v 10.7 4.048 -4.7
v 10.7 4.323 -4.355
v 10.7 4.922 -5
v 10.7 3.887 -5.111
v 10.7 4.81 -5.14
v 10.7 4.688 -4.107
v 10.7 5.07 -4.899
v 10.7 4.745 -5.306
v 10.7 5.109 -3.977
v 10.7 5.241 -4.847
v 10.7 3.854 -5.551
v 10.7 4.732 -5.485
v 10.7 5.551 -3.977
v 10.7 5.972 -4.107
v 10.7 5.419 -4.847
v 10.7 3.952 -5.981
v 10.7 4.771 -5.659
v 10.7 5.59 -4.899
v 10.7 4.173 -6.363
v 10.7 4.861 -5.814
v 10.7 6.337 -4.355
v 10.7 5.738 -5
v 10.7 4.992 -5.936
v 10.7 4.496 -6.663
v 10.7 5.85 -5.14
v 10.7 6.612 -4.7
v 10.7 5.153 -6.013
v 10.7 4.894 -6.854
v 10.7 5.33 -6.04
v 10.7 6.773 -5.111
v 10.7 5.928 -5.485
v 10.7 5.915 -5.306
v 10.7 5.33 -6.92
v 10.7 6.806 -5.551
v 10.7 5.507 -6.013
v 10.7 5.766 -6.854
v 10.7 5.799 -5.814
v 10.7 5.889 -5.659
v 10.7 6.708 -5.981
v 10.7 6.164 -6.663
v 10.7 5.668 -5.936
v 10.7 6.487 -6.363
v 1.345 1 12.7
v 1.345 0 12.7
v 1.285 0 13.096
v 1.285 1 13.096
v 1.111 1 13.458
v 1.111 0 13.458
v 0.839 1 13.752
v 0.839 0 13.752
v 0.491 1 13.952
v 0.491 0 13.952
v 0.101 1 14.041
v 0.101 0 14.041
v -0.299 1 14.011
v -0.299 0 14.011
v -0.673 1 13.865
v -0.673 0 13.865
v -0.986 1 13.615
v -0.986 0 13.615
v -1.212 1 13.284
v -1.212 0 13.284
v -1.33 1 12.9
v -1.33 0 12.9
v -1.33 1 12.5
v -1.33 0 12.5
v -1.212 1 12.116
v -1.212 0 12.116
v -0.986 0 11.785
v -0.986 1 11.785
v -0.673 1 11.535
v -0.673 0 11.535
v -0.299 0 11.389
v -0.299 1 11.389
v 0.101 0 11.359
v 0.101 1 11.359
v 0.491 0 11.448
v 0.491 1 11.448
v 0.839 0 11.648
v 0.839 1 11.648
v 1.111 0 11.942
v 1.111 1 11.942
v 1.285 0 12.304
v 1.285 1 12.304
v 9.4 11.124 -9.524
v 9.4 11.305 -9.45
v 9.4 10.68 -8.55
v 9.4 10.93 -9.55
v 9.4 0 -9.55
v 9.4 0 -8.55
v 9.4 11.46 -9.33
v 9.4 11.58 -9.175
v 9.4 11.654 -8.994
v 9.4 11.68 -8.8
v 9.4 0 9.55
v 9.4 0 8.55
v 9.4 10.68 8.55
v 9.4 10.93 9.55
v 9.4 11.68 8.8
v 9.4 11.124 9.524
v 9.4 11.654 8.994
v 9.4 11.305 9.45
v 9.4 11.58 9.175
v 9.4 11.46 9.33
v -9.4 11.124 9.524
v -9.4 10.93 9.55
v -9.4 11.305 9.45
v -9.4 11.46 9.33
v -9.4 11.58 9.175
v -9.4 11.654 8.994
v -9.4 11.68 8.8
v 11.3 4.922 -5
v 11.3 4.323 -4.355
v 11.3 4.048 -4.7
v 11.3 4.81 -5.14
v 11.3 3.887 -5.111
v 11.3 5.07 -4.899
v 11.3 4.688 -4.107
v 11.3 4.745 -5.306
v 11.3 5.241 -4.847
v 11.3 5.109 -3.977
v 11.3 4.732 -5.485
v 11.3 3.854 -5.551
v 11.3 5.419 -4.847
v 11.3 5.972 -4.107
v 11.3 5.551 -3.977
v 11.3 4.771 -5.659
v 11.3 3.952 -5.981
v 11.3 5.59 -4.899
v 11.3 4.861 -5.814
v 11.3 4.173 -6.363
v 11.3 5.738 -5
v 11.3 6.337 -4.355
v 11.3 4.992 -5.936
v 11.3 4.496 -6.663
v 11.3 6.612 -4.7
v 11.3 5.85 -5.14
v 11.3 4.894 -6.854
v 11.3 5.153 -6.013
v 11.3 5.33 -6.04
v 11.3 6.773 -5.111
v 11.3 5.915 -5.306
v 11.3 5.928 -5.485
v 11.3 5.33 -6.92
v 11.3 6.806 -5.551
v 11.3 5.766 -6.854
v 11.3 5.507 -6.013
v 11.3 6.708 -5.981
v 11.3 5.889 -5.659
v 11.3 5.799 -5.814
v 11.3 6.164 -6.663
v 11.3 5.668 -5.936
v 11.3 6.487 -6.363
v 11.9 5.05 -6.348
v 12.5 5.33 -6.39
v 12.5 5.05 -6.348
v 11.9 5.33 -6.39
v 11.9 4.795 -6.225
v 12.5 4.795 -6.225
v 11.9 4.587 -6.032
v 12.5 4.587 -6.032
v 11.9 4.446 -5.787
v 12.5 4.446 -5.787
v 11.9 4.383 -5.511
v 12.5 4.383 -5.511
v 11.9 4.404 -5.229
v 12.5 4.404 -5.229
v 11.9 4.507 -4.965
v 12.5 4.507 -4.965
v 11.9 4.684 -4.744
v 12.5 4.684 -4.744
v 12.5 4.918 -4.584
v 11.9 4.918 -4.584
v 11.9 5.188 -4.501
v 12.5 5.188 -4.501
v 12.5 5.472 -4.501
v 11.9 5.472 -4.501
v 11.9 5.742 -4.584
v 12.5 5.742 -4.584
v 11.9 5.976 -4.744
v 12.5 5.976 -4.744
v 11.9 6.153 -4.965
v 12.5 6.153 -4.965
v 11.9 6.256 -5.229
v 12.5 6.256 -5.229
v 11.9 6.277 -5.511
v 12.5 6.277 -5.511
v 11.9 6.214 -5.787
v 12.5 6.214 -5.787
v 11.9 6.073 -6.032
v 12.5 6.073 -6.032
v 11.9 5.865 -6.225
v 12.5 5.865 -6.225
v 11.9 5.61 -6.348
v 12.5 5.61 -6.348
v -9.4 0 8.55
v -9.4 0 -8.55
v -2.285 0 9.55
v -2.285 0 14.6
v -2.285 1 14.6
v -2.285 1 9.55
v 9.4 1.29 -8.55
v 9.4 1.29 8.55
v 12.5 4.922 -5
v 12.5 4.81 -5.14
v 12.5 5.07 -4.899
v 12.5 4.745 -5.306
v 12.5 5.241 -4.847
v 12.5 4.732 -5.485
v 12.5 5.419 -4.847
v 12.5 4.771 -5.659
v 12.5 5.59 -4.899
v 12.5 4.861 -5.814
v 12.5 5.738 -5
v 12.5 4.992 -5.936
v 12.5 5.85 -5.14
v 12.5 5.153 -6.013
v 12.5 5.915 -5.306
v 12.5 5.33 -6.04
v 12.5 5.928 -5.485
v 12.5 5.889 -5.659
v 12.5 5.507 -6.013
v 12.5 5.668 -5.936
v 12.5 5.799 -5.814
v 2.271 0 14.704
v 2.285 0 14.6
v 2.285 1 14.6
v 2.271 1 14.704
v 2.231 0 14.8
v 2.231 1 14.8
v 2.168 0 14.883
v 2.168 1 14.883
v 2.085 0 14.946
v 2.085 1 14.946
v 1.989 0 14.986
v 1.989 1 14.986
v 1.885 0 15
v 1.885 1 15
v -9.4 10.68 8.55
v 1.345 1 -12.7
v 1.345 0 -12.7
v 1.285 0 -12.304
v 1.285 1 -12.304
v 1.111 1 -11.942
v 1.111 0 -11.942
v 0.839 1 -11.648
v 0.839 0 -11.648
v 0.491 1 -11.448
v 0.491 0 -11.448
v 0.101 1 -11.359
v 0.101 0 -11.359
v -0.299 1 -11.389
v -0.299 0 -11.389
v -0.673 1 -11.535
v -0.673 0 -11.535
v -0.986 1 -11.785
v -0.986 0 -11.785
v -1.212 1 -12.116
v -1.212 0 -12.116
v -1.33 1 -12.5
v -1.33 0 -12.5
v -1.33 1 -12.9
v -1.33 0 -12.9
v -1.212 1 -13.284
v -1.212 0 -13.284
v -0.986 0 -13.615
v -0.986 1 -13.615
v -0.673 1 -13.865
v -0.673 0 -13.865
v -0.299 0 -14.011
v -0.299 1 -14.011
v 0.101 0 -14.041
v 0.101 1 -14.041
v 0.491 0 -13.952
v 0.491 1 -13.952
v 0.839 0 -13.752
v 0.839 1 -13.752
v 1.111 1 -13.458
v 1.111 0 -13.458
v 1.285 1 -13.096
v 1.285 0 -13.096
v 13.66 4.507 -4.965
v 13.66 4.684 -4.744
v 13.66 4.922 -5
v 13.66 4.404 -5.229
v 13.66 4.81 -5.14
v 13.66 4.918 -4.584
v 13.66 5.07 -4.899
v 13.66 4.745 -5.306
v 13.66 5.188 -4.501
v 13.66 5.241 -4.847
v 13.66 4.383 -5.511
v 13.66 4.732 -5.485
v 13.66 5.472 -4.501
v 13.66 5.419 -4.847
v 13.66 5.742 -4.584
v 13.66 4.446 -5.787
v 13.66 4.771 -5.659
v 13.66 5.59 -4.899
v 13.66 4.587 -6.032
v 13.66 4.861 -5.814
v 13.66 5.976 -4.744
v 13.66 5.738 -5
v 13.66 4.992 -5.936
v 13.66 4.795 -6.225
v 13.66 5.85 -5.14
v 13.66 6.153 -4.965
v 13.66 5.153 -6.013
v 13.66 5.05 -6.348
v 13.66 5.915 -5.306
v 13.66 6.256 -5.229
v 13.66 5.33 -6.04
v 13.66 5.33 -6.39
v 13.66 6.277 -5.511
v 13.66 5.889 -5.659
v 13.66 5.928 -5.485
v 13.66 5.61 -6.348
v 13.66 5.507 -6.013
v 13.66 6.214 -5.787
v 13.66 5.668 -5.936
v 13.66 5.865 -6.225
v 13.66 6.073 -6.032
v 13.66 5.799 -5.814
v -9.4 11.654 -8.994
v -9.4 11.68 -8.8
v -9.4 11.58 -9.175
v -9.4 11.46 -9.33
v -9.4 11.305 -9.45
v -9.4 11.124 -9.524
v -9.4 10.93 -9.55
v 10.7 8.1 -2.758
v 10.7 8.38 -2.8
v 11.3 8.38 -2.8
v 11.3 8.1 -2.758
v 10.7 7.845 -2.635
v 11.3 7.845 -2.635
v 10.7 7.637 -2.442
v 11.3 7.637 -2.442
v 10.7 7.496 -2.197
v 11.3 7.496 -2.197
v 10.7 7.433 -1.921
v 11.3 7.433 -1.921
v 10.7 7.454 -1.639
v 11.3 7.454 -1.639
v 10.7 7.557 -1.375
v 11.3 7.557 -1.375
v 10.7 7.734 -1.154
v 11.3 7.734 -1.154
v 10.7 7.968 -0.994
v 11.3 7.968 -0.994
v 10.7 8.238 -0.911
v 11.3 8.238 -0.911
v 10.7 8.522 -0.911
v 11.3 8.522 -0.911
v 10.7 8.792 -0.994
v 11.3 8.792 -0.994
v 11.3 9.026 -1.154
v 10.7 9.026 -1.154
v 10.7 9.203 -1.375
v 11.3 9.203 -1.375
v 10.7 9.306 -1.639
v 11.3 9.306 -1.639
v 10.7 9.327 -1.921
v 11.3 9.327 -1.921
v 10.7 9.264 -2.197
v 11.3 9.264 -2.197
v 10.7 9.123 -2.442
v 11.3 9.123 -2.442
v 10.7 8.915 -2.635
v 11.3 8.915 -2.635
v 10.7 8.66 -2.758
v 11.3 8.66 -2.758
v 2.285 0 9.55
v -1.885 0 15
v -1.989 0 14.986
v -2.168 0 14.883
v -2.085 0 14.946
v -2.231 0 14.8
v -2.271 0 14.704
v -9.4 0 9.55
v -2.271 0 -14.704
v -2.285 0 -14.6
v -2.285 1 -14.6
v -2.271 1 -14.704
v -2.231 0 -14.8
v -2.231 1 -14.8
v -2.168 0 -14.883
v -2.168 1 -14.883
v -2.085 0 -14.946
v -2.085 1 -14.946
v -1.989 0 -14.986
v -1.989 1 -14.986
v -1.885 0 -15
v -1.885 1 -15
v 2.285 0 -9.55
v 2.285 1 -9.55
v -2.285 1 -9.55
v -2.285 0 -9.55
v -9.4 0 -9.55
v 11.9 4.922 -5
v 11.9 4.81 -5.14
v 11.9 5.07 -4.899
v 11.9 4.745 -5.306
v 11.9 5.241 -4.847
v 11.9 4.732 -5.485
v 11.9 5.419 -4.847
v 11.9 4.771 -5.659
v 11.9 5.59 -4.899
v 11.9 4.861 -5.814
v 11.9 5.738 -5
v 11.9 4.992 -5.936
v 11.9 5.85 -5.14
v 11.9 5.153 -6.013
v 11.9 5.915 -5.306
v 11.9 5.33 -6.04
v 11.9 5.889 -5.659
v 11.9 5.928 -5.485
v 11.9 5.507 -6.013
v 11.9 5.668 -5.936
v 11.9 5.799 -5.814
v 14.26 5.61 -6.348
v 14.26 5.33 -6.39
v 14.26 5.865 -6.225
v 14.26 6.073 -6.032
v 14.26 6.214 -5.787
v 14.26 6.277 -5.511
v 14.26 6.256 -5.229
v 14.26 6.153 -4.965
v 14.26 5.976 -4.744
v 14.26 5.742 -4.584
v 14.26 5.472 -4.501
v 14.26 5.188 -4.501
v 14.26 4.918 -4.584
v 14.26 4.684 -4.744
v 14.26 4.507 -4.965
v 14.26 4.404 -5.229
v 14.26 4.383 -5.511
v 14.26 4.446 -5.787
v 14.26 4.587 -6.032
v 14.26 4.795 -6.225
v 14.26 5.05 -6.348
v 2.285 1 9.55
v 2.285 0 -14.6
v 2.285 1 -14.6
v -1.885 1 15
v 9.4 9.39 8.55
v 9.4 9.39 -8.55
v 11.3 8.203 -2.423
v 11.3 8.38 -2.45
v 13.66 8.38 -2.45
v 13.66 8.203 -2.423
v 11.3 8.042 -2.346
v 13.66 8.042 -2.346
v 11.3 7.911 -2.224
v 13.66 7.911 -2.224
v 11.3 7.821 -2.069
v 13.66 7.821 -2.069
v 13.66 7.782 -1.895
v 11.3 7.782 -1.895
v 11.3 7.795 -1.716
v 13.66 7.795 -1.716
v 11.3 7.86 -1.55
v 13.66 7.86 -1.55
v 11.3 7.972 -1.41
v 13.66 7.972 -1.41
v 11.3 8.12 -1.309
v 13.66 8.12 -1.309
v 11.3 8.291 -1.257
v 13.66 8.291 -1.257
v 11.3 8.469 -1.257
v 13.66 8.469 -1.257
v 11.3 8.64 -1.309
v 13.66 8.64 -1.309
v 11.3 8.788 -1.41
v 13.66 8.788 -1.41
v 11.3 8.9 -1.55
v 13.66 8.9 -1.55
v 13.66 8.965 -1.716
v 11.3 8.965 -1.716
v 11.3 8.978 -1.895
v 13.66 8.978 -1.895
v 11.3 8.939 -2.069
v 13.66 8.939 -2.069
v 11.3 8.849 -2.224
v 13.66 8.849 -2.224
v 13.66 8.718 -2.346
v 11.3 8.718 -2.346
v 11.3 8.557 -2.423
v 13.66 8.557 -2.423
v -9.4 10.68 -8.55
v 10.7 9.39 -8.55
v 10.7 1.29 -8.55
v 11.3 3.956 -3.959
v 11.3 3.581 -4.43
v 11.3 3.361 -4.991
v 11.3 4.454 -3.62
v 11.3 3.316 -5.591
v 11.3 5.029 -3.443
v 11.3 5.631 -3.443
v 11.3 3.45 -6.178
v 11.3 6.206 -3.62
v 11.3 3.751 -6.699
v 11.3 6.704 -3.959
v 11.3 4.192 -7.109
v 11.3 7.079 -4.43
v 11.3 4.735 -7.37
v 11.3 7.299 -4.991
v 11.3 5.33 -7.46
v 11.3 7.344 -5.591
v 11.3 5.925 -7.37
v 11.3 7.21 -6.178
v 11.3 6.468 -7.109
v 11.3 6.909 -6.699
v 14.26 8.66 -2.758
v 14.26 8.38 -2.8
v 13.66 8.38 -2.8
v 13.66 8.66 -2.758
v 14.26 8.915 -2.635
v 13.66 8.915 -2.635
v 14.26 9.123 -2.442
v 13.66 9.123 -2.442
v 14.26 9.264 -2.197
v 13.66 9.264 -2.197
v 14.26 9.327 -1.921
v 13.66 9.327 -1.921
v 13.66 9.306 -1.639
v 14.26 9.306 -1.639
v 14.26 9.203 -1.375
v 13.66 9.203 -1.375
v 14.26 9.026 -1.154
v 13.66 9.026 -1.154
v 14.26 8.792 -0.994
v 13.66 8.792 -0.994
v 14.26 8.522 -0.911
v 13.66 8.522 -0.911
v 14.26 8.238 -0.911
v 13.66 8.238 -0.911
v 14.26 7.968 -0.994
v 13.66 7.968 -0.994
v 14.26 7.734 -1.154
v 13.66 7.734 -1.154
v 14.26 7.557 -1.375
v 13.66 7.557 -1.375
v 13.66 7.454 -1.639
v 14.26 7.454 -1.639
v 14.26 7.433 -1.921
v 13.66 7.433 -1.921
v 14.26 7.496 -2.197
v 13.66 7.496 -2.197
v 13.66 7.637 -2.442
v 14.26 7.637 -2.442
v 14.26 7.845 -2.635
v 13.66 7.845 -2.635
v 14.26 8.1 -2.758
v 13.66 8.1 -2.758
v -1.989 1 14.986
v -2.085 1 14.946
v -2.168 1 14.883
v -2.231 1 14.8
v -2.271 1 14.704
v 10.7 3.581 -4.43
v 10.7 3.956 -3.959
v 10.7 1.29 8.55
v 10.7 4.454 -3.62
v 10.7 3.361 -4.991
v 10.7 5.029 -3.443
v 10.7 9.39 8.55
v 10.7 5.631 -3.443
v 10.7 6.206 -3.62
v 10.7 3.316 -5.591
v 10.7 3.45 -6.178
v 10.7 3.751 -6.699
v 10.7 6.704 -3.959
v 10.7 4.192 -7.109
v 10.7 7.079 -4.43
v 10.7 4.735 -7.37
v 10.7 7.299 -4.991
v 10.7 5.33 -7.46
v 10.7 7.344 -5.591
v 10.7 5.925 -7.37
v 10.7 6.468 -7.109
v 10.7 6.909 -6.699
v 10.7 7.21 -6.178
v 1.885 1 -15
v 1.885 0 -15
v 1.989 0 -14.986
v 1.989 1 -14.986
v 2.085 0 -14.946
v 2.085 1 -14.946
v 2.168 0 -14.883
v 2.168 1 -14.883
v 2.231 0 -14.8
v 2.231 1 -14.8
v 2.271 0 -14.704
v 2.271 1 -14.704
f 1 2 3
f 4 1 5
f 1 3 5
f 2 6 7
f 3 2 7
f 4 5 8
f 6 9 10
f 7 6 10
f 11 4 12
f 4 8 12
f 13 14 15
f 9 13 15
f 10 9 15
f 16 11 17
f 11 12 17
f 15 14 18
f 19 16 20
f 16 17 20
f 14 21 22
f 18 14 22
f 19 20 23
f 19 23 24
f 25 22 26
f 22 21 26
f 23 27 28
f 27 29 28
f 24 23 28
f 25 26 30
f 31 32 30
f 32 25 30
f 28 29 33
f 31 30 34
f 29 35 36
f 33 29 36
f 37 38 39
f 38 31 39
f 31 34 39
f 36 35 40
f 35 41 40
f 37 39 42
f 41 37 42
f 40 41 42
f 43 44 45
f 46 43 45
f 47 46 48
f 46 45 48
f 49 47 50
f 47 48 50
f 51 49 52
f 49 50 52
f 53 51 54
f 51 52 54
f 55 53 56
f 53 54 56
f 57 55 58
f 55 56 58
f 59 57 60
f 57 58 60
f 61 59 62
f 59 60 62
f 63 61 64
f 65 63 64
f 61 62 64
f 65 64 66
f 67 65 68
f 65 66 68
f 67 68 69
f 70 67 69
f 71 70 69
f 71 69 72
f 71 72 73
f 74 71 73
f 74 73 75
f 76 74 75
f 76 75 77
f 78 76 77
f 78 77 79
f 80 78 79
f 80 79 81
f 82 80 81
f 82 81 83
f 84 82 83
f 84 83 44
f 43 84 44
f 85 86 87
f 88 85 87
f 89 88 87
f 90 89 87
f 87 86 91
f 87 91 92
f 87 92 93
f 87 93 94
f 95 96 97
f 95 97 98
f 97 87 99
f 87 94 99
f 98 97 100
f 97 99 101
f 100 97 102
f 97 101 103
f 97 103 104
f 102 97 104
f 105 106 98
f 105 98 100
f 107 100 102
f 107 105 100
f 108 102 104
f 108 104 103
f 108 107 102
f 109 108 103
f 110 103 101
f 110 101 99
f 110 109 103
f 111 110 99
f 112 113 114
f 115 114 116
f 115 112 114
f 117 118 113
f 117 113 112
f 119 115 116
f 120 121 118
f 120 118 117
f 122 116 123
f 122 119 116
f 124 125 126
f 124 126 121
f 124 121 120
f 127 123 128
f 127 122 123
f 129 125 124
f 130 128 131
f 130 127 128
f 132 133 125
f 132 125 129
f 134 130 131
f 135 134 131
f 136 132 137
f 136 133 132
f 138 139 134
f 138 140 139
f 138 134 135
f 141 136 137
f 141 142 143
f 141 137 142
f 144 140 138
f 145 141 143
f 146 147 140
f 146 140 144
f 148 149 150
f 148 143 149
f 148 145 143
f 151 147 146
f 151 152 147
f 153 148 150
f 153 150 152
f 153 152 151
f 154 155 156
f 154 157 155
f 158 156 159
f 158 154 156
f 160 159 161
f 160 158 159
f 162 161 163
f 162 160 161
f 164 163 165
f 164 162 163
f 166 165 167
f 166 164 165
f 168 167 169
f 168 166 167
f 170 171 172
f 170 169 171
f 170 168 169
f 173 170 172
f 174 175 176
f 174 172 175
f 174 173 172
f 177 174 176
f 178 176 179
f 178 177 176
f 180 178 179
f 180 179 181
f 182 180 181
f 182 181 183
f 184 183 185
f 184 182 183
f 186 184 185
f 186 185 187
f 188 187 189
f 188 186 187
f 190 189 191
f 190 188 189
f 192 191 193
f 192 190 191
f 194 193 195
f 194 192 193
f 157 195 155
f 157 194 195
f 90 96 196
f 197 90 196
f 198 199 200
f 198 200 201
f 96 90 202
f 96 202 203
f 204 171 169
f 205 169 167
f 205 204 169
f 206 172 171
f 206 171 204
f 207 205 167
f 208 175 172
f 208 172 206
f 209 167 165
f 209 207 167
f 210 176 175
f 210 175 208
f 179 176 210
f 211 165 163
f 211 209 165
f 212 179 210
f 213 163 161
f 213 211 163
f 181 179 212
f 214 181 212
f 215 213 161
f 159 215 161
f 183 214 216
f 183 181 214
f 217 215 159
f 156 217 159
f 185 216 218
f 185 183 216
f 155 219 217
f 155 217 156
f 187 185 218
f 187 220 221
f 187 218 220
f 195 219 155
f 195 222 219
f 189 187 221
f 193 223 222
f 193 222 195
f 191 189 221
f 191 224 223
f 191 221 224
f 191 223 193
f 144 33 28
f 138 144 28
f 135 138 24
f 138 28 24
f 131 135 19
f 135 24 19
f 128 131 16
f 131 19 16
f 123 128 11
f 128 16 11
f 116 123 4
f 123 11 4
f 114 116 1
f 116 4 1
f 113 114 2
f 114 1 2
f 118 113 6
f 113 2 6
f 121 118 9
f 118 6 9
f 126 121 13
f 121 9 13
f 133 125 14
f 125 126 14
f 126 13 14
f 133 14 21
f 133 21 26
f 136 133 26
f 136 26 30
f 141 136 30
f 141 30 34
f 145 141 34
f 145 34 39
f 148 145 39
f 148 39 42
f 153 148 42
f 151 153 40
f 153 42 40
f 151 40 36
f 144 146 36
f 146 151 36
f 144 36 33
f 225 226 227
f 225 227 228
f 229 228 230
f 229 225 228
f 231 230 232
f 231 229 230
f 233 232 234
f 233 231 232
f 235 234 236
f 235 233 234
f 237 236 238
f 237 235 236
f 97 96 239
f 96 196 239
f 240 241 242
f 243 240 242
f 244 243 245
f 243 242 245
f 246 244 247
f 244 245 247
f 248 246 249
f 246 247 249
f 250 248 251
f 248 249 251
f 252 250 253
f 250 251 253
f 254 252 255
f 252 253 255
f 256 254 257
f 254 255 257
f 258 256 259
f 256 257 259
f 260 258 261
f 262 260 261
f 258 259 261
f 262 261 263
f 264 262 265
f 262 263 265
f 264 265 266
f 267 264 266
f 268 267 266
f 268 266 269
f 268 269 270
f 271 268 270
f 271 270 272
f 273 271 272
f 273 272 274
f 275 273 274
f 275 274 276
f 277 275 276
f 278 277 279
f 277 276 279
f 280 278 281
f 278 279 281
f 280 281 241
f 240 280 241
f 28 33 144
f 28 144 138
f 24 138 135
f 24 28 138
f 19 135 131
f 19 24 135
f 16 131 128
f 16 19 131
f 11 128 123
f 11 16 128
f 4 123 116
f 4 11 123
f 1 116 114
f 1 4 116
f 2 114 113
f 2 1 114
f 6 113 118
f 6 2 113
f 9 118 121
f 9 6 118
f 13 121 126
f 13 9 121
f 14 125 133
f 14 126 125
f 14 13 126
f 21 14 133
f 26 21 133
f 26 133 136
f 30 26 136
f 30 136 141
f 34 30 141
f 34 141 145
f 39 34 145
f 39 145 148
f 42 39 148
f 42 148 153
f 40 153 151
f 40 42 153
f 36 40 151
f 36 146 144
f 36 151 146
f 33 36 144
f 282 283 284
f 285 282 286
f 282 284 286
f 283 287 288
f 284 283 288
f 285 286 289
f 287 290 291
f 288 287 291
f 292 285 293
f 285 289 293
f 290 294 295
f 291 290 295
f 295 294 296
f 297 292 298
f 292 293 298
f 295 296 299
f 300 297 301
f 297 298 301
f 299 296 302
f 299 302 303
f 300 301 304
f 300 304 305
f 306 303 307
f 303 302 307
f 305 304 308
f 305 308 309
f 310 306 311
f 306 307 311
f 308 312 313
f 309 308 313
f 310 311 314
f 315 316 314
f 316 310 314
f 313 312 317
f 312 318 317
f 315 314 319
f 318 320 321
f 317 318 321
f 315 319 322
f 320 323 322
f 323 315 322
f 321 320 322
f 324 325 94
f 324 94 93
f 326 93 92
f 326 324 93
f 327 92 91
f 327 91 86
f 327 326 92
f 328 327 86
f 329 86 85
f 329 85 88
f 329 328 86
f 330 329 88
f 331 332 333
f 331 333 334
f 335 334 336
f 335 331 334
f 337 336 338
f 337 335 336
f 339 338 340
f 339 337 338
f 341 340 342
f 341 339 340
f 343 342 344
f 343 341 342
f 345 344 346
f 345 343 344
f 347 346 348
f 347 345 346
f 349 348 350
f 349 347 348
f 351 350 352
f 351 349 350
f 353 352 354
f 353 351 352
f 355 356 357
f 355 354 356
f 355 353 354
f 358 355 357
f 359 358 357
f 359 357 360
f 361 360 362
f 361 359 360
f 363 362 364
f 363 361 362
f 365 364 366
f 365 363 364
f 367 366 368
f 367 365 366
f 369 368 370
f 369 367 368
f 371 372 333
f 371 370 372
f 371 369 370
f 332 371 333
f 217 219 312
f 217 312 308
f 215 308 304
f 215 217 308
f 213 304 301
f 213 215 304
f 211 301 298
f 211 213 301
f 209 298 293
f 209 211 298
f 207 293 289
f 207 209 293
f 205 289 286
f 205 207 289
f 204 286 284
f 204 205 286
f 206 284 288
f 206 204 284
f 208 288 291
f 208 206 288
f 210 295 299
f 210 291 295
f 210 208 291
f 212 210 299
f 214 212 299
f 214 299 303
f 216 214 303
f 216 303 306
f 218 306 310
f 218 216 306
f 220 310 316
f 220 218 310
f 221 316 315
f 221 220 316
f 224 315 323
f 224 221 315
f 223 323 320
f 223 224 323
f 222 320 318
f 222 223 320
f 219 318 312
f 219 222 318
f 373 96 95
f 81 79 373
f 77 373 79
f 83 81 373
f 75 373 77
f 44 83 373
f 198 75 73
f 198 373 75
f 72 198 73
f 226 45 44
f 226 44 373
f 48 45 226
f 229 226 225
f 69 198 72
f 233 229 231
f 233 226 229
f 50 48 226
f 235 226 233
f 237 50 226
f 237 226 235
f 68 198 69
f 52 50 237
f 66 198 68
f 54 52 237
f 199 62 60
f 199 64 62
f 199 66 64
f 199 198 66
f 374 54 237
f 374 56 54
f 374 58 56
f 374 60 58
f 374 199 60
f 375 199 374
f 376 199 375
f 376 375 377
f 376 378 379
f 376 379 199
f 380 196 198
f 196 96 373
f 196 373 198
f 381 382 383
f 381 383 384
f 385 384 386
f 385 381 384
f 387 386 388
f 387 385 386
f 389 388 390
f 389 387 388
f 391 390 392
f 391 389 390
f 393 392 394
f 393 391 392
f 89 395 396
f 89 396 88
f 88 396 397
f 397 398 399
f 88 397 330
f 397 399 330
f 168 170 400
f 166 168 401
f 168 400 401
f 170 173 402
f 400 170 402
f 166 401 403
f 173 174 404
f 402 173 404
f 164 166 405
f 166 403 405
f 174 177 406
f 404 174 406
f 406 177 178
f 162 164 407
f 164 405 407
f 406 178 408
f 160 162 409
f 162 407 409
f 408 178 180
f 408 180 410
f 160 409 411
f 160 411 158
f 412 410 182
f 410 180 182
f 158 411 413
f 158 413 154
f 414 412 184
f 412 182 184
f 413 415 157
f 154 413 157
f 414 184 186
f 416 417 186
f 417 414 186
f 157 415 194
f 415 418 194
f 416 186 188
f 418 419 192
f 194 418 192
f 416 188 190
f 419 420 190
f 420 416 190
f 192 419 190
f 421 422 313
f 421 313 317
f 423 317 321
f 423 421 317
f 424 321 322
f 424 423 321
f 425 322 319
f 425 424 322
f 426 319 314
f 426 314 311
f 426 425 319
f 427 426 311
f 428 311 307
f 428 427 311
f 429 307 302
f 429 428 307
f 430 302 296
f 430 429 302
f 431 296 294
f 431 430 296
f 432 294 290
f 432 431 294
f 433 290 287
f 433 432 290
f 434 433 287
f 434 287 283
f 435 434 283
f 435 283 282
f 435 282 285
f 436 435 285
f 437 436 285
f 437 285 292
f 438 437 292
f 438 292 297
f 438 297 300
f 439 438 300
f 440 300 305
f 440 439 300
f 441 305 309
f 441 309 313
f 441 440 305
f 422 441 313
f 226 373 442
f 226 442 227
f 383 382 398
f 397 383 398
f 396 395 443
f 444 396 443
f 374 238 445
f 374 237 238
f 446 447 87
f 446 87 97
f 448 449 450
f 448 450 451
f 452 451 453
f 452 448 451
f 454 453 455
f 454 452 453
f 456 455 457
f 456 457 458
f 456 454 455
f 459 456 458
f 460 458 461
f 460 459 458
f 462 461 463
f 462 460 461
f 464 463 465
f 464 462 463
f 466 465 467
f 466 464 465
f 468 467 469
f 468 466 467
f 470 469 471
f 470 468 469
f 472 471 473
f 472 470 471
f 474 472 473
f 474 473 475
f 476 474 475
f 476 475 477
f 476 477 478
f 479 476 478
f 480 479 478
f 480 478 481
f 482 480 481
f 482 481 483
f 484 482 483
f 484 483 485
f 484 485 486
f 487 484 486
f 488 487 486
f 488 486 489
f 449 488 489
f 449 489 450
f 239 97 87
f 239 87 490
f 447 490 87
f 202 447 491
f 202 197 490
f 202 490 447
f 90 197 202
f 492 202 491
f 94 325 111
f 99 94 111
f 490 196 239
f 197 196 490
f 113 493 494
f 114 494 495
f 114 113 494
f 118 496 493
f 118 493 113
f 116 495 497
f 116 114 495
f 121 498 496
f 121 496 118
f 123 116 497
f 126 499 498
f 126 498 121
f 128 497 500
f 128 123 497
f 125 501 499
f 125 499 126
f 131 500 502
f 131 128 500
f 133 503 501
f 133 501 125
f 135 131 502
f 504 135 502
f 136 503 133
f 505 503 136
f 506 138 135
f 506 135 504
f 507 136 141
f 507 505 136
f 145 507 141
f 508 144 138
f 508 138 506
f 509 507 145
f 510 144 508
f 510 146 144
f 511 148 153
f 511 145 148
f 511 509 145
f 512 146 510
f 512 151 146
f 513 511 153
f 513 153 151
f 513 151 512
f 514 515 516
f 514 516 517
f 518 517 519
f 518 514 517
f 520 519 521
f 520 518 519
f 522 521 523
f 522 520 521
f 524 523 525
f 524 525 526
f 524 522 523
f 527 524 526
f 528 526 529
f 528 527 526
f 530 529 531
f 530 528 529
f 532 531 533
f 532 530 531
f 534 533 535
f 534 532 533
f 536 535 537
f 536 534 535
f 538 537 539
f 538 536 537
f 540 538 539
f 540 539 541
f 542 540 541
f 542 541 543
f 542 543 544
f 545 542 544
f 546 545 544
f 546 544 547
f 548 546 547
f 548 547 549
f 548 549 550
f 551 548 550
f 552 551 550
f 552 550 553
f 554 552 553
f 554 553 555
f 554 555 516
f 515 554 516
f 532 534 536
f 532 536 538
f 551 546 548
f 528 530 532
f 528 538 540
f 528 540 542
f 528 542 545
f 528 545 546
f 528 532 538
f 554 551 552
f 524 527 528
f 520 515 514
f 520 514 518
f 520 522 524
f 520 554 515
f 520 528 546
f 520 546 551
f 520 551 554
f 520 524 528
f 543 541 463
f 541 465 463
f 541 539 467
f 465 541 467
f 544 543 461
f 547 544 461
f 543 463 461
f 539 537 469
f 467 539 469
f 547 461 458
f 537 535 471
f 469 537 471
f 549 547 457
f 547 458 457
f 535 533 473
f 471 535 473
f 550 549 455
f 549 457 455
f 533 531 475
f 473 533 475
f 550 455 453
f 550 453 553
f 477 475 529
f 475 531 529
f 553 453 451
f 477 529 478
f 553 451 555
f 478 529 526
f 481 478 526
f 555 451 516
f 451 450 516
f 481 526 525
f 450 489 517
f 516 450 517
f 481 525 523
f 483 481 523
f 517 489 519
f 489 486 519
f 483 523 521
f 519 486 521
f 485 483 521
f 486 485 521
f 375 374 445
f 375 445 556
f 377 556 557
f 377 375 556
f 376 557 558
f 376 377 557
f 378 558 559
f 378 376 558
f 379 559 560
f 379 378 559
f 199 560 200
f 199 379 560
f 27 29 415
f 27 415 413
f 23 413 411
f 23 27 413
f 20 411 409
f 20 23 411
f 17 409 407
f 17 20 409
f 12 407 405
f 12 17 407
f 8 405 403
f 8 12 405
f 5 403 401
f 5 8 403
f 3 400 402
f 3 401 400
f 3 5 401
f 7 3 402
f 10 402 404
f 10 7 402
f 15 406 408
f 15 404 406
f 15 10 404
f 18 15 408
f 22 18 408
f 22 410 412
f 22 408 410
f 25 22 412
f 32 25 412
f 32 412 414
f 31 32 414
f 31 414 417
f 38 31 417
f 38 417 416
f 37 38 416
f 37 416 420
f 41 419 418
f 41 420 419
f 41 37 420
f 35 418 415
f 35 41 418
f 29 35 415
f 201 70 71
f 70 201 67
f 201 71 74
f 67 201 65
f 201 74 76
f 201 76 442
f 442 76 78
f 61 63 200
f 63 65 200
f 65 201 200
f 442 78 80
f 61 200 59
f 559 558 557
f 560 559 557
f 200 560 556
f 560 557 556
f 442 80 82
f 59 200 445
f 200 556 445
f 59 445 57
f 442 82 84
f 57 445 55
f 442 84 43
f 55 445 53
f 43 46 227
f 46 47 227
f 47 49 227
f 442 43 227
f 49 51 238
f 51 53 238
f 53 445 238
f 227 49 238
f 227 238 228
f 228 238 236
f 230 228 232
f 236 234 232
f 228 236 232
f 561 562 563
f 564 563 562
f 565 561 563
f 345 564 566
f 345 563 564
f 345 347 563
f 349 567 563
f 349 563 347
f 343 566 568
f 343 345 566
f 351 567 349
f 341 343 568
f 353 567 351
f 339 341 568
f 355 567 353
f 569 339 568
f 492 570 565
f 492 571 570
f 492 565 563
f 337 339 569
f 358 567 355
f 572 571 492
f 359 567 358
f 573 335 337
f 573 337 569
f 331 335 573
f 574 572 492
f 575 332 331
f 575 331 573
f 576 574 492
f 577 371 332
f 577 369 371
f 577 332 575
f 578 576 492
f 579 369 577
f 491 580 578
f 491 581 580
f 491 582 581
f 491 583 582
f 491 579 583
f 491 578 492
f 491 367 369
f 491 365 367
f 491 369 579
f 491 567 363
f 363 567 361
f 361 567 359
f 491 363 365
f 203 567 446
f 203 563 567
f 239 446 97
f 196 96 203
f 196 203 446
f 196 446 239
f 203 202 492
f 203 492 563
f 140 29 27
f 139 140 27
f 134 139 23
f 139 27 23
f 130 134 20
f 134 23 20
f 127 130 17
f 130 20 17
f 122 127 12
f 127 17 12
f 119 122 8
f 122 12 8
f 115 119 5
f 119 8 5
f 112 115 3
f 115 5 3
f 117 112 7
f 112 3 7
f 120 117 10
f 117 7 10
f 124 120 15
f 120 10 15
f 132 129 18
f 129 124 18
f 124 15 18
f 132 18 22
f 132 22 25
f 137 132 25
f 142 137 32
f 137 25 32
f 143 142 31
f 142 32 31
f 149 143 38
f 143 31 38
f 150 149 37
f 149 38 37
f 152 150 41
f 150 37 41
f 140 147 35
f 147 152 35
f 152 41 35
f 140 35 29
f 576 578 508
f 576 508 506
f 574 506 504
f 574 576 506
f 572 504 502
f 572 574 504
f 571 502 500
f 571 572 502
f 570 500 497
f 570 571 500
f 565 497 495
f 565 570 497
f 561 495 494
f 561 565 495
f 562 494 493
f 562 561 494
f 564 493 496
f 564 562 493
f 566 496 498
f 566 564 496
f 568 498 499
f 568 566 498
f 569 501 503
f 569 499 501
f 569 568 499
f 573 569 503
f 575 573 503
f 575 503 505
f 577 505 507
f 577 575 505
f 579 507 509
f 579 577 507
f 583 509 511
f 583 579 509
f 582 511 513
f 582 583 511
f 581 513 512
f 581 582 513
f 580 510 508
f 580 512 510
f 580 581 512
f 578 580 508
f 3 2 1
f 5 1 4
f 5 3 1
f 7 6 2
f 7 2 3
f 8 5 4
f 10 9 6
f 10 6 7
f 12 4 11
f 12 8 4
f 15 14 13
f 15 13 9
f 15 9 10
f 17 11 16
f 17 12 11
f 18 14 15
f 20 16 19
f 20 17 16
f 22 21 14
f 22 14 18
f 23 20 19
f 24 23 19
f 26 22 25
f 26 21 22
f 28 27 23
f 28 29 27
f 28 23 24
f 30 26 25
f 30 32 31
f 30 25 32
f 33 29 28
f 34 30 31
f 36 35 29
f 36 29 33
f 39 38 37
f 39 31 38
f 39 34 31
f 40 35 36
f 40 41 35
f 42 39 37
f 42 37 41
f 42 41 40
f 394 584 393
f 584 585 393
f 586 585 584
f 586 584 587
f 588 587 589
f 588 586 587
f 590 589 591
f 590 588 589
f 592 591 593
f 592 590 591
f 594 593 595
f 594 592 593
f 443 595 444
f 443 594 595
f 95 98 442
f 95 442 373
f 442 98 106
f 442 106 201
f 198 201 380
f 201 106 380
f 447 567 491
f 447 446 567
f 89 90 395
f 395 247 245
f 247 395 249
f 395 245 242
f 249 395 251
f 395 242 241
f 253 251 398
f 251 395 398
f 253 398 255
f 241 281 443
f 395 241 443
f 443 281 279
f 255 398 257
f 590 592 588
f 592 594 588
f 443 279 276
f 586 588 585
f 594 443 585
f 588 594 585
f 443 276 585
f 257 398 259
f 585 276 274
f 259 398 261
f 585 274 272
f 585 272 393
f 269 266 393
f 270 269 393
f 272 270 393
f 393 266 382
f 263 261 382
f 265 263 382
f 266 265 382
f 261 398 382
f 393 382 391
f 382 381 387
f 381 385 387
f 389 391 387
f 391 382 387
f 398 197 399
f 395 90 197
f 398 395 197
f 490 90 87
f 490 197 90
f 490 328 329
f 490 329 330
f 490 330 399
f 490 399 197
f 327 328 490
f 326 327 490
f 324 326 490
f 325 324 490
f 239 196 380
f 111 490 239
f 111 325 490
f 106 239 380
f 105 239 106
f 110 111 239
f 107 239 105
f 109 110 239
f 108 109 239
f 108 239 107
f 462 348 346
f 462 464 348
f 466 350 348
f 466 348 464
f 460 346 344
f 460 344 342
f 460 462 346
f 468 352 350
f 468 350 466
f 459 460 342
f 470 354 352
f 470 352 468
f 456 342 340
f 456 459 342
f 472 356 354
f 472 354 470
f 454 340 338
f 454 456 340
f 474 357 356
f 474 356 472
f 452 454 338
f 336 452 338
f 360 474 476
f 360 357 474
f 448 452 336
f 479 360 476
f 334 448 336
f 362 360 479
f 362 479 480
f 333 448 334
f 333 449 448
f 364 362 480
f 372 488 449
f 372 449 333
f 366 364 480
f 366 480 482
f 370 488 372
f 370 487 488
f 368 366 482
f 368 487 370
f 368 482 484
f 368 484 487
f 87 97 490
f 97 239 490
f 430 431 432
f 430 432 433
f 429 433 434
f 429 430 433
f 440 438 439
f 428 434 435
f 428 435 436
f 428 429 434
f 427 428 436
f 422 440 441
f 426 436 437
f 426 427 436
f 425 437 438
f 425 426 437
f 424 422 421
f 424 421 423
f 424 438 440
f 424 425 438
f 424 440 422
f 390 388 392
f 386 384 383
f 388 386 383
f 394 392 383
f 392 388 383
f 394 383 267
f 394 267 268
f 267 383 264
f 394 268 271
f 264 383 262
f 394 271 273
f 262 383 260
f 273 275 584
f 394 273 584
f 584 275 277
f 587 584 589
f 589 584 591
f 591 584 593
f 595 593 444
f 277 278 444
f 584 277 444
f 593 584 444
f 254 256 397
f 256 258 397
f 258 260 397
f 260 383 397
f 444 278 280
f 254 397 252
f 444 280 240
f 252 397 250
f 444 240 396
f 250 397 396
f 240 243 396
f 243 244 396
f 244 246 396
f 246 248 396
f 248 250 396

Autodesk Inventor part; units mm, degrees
ref_plane "YZ Plane" through (0, 0, 0) normal (1, 0, 0) x (0, 1, 0)
ref_plane "XZ Plane" through (0, 0, 0) normal (0, 1, 0) x (-1, 0, 0)
ref_plane "XY Plane" through (0, 0, 0) normal (0, 0, 1) x (1, 0, 0)
sketch "sketch_main_body" plane through (0, 0, 0) normal (0, 1, 0) x (-1, 0, 0)
  line L0 (9.4, -8.55) -> (-9.4, -8.55)
  line L1 (-9.4, -8.55) -> (-9.4, 8.55)
  line L2 (-9.4, 8.55) -> (9.4, 8.55)
  line L3 (9.4, 8.55) -> (9.4, -8.55)
  line L4 (9.4, -8.55) -> (-9.4, 8.55) construction
  line L5 (-9.4, -8.55) -> (9.4, 8.55) construction
  point P0 (0, 0)
  dimension "d0" = 18.8
  dimension "d1" = 17.1
extrude "main_body" add sketch "sketch_main_body" along normal blind 10.68
sketch "sketch_aluminium_shield" plane through (-9.4, 0, -8.55) normal (-1, 0, 0) x (0, 0, 1)
  line L0 (0, 0) -> (0, 10.68) projected
  line L1 (0, 0) -> (-1, 0)
  line L2 (-1, 0) -> (-1, 10.93)
  line L3 (-0.25, 11.68) -> (0.0237, 11.68)
  line L4 (0, 10.68) -> (0, 0)
  line L5 (0.0237, 11.68) -> (17.35, 11.68)
  line L6 (18.1, 10.93) -> (18.1, 10.5311)
  line L7 (17.1, 10.68) -> (0, 10.68)
  line L8 (17.1, 0) -> (17.1, 10.68) projected
  line L9 (17.1, 10.5311) -> (17.1, 0)
  line L10 (17.1, 0) -> (18.1, 0)
  line L11 (18.1, 0) -> (18.1, 10.68)
  arc A0 (-0.25, 11.68) -> (-1, 10.93) centre (-0.25, 10.93) ccw
  arc A1 (18.1, 10.93) -> (17.35, 11.68) centre (17.35, 10.93) ccw
  point P0 (8.55, 0)
  dimension "d5" = 1
  dimension "d6" = 1
  dimension "d7" = 1
  dimension "d8" = 0.75
extrude "aluminium_shield" add sketch "sketch_aluminium_shield" against normal blind 18.8 separate body
sketch "sketch_mount" plane through (0, 0, 0) normal (0, -1, 0) x (1, 0, 0)
  line L0 (-9.4, 9.55) -> (9.4, 9.55) projected
  line L1 (-2.285, 9.55) -> (2.285, 9.55)
  line L2 (2.285, 9.55) -> (2.285, 14.6)
  line L3 (1.885, 15) -> (-1.885, 15)
  line L4 (-2.285, 14.6) -> (-2.285, 9.55)
  circle A0 centre (0, 12.7) radius 1.345
  arc A1 (-1.885, 15) -> (-2.285, 14.6) centre (-1.885, 14.6) ccw
  arc A2 (2.285, 14.6) -> (1.885, 15) centre (1.885, 14.6) ccw
  line L5 (-12.1941, 0) -> (12.1129, 0) construction
  line L6 (-9.4, -9.55) -> (9.4, -9.55)
  line L7 (2.285, -9.55) -> (2.285, -14.6)
  line L8 (1.885, -15) -> (-1.885, -15)
  line L9 (-2.285, -14.6) -> (-2.285, -9.55)
  circle A3 centre (0, -12.7) radius 1.345
  arc A4 (-2.285, -14.6) -> (-1.885, -15) centre (-1.885, -14.6) ccw
  arc A5 (1.885, -15) -> (2.285, -14.6) centre (1.885, -14.6) ccw
  point P0 (0, 0)
  point P1 (0, 9.55)
  point P2 (2.285, 9.55)
  dimension "d11" = 5.45
  dimension "d12" = 4.57
  dimension "d14" = 7.115
  dimension "d15" = 0.4
  dimension "d16" = 2.69
  dimension "d17" = 3.15
extrude "mount" add sketch "sketch_mount" against normal blind 1 bodies 2
sketch "sketch_bulge" plane through (9.4, 0, 8.55) normal (1, 0, 0) x (0, 0, -1)
  line L0 (0, 0) -> (0, 10.68) projected
  line L1 (17.1, 0) -> (17.1, 10.68) projected
  line L2 (0, 9.39) -> (17.1, 9.39)
  line L3 (17.1, 9.39) -> (17.1, 1.29)
  line L4 (17.1, 1.29) -> (0, 1.29)
  line L5 (0, 1.29) -> (0, 9.39)
  line L6 (0, 10.68) -> (17.1, 10.68) projected
  point P0 (8.55, 0)
  point P1 (0, 1.29)
  dimension "d20" = 8.1
  dimension "d21" = 1.29
extrude "bulge" add sketch "sketch_bulge" along normal blind 1.3 contours L0 L2 L1 L4 bodies 1
sketch "sketch_power_ports" plane through (10.7, 0, 8.55) normal (1, 0, 0) x (0, 0, -1)
  circle A0 centre (13.99, 5.33) radius 0.95
  circle A1 centre (13.99, 5.33) radius 0.6
  line L0 (0, 0) -> (17.1, 0) projected
  circle A2 centre (13.99, 5.33) radius 2.02
  line L1 (-1, 10.93) -> (-1, 0) projected
  circle A3 centre (10.4, 8.38) radius 0.95
  circle A4 centre (10.4, 8.38) radius 0.6
  circle A5 centre (13.99, 5.33) radius 1.48
  point P0 (8.55, 0)
  dimension "d24" = 1.2
  dimension "d25" = 1.9
  dimension "d26" = 5.33
  dimension "d27" = 4.04
  dimension "d28" = 14.99
  dimension "d29" = 1.2
  dimension "d30" = 1.9
  dimension "d31" = 8.38
  dimension "d32" = 11.4
  dimension "d45" = 2.96
extrude "Extrusion5" add sketch "sketch_power_ports" along normal blind 3.56 contours A4 bodies 1
extrude "Extrusion6" add sketch "sketch_power_ports" along normal blind 0.6 from surface at 0 contours A3 | A4 bodies 1
extrude "Extrusion7" add sketch "sketch_power_ports" against normal blind 0.6 from surface at 3.56 contours A3 | A4 bodies 1
extrude "Extrusion9" add sketch "sketch_power_ports" along normal blind 3.56 contours A1 bodies 1
extrude "Extrusion11" add sketch "sketch_power_ports" along normal blind 0.6 separate body contours A0 | A5
extrude "Extrusion12" add sketch "sketch_power_ports" along normal blind 0.6 contours A2 bodies 1
extrude "Extrusion13" add sketch "sketch_power_ports" against normal blind 0.6 from surface at 3.56 contours A0 bodies 1
extrude "Extrusion14" add sketch "sketch_power_ports" along normal blind 1.2 from surface at 0.6 contours A0 bodies 1
extrude "Extrusion15" cut sketch "sketch_power_ports" along normal blind 1.2 contours A0 bodies 1
properties part number "Mini-Circuits_Case_GC957"
